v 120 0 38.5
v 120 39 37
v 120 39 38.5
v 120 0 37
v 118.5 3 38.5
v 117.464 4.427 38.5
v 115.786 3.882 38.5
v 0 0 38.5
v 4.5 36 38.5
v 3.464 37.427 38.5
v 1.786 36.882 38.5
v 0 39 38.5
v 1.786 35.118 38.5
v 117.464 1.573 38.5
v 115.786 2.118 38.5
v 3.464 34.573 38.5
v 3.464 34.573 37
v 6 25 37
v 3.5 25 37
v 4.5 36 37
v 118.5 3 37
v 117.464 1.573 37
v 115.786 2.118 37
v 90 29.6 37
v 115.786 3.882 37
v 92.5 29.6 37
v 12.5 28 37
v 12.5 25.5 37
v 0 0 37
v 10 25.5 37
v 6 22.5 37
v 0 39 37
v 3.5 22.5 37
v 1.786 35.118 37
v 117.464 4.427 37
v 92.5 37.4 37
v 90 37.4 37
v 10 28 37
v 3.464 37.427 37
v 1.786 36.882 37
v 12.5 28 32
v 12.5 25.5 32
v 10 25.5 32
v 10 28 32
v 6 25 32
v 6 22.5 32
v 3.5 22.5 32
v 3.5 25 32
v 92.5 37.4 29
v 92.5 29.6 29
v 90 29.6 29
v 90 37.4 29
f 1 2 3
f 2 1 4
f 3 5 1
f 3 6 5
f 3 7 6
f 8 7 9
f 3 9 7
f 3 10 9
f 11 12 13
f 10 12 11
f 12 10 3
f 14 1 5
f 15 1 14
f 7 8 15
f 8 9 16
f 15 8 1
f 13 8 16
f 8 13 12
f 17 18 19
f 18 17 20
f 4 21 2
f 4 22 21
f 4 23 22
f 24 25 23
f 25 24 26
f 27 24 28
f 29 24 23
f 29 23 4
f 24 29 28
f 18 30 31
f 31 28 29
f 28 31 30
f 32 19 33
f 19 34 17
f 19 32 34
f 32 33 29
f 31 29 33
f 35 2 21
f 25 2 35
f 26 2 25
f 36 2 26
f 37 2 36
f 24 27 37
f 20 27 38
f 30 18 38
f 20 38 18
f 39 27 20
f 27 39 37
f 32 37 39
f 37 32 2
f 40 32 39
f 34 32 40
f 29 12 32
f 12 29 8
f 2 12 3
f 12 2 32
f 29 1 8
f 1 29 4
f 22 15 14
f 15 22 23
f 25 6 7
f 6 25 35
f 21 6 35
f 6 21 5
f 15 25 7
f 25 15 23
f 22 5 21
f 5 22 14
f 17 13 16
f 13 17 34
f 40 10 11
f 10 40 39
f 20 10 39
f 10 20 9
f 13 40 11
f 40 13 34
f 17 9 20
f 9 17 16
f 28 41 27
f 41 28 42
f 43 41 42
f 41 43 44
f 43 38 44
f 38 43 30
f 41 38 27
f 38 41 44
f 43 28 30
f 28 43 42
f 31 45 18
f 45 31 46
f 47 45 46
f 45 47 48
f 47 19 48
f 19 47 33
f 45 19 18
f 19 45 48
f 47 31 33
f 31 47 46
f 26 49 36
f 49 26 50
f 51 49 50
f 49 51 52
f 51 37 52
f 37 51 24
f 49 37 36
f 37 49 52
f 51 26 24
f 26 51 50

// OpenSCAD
// Parametros Configuraveis
altura=37;
espessura=1.5;
altura_suporte=50;


parafuso_comprimento = 10;
parafuso_raio = 1.5;



module caixa() {
    // Base
    difference() {
        cube([120,29+8.5,espessura]);
        translate([57.5,23.5,0]) cube([20,7.5,espessura]);
    }

    // Tampa ao lado da Pilha
    cube([120,espessura,altura]);

    // Tampa traseira
    translate([120-espessura,0,0]) cube([espessura,37.5,altura]);

    // Tampa frontal
    cube([espessura,37.5,altura]);

    // Lateral interna do GPS
    translate([80,28,0]) cube([40,espessura,altura]);
    
    // Lateral para segurar a placa
    translate([105,21,0]) cube([15,espessura,altura]);
    
    translate([0,21,0]) cube([15,espessura,altura]);

    // Tampa Lateral
    translate([0,37.5,0]) cube([120,espessura,altura]);
    
 
    // Cilindro para o parafuso
    difference() {
        translate([3,36,0]) cylinder(altura,3,3);
        translate([3,36,altura-parafuso_comprimento])
            cylinder(parafuso_comprimento,parafuso_raio,parafuso_raio);
    }
    difference() {
        translate([117,3,0]) cylinder(altura,3,3);
        translate([117,3,altura-parafuso_comprimento])
            cylinder(parafuso_comprimento,parafuso_raio,parafuso_raio);
    }

 
    // translate([35.5,0,0]) cube([espessura,30,altura]);
    // translate([32,19,0]) cube([4,3,altura_suporte]);

    // Lado interruptor
    // cube([espessura,30,altura]);
    // translate([espessura,19,0]) cube([4,3,altura_suporte]);

    // Tampa Frontal
    // translate([0,30,0]) cube([37,espessura,altura]);
}

module tampa() {
    difference() {
        cube([120,39,espessura]);
        translate([117,3,0])
            cylinder(parafuso_comprimento,parafuso_raio,parafuso_raio);
        translate([3,36,0])
            cylinder(parafuso_comprimento,parafuso_raio,parafuso_raio);
    }
    
    translate([10,25.5,-5]) cube([2.5,2.5,5]);
    translate([3.5,22.5,-5]) cube([2.5,2.5,5]);
    translate([90,29.6,-8]) cube([2.5,7.8,8]);
}


// caixa();

translate([0,0,37]) tampa();

// Mostra o modelo 3D da placa
// translate([65,-83,-11]) rotate([0,0,0]) import("TTGO_SIM7000GV1.stl");
